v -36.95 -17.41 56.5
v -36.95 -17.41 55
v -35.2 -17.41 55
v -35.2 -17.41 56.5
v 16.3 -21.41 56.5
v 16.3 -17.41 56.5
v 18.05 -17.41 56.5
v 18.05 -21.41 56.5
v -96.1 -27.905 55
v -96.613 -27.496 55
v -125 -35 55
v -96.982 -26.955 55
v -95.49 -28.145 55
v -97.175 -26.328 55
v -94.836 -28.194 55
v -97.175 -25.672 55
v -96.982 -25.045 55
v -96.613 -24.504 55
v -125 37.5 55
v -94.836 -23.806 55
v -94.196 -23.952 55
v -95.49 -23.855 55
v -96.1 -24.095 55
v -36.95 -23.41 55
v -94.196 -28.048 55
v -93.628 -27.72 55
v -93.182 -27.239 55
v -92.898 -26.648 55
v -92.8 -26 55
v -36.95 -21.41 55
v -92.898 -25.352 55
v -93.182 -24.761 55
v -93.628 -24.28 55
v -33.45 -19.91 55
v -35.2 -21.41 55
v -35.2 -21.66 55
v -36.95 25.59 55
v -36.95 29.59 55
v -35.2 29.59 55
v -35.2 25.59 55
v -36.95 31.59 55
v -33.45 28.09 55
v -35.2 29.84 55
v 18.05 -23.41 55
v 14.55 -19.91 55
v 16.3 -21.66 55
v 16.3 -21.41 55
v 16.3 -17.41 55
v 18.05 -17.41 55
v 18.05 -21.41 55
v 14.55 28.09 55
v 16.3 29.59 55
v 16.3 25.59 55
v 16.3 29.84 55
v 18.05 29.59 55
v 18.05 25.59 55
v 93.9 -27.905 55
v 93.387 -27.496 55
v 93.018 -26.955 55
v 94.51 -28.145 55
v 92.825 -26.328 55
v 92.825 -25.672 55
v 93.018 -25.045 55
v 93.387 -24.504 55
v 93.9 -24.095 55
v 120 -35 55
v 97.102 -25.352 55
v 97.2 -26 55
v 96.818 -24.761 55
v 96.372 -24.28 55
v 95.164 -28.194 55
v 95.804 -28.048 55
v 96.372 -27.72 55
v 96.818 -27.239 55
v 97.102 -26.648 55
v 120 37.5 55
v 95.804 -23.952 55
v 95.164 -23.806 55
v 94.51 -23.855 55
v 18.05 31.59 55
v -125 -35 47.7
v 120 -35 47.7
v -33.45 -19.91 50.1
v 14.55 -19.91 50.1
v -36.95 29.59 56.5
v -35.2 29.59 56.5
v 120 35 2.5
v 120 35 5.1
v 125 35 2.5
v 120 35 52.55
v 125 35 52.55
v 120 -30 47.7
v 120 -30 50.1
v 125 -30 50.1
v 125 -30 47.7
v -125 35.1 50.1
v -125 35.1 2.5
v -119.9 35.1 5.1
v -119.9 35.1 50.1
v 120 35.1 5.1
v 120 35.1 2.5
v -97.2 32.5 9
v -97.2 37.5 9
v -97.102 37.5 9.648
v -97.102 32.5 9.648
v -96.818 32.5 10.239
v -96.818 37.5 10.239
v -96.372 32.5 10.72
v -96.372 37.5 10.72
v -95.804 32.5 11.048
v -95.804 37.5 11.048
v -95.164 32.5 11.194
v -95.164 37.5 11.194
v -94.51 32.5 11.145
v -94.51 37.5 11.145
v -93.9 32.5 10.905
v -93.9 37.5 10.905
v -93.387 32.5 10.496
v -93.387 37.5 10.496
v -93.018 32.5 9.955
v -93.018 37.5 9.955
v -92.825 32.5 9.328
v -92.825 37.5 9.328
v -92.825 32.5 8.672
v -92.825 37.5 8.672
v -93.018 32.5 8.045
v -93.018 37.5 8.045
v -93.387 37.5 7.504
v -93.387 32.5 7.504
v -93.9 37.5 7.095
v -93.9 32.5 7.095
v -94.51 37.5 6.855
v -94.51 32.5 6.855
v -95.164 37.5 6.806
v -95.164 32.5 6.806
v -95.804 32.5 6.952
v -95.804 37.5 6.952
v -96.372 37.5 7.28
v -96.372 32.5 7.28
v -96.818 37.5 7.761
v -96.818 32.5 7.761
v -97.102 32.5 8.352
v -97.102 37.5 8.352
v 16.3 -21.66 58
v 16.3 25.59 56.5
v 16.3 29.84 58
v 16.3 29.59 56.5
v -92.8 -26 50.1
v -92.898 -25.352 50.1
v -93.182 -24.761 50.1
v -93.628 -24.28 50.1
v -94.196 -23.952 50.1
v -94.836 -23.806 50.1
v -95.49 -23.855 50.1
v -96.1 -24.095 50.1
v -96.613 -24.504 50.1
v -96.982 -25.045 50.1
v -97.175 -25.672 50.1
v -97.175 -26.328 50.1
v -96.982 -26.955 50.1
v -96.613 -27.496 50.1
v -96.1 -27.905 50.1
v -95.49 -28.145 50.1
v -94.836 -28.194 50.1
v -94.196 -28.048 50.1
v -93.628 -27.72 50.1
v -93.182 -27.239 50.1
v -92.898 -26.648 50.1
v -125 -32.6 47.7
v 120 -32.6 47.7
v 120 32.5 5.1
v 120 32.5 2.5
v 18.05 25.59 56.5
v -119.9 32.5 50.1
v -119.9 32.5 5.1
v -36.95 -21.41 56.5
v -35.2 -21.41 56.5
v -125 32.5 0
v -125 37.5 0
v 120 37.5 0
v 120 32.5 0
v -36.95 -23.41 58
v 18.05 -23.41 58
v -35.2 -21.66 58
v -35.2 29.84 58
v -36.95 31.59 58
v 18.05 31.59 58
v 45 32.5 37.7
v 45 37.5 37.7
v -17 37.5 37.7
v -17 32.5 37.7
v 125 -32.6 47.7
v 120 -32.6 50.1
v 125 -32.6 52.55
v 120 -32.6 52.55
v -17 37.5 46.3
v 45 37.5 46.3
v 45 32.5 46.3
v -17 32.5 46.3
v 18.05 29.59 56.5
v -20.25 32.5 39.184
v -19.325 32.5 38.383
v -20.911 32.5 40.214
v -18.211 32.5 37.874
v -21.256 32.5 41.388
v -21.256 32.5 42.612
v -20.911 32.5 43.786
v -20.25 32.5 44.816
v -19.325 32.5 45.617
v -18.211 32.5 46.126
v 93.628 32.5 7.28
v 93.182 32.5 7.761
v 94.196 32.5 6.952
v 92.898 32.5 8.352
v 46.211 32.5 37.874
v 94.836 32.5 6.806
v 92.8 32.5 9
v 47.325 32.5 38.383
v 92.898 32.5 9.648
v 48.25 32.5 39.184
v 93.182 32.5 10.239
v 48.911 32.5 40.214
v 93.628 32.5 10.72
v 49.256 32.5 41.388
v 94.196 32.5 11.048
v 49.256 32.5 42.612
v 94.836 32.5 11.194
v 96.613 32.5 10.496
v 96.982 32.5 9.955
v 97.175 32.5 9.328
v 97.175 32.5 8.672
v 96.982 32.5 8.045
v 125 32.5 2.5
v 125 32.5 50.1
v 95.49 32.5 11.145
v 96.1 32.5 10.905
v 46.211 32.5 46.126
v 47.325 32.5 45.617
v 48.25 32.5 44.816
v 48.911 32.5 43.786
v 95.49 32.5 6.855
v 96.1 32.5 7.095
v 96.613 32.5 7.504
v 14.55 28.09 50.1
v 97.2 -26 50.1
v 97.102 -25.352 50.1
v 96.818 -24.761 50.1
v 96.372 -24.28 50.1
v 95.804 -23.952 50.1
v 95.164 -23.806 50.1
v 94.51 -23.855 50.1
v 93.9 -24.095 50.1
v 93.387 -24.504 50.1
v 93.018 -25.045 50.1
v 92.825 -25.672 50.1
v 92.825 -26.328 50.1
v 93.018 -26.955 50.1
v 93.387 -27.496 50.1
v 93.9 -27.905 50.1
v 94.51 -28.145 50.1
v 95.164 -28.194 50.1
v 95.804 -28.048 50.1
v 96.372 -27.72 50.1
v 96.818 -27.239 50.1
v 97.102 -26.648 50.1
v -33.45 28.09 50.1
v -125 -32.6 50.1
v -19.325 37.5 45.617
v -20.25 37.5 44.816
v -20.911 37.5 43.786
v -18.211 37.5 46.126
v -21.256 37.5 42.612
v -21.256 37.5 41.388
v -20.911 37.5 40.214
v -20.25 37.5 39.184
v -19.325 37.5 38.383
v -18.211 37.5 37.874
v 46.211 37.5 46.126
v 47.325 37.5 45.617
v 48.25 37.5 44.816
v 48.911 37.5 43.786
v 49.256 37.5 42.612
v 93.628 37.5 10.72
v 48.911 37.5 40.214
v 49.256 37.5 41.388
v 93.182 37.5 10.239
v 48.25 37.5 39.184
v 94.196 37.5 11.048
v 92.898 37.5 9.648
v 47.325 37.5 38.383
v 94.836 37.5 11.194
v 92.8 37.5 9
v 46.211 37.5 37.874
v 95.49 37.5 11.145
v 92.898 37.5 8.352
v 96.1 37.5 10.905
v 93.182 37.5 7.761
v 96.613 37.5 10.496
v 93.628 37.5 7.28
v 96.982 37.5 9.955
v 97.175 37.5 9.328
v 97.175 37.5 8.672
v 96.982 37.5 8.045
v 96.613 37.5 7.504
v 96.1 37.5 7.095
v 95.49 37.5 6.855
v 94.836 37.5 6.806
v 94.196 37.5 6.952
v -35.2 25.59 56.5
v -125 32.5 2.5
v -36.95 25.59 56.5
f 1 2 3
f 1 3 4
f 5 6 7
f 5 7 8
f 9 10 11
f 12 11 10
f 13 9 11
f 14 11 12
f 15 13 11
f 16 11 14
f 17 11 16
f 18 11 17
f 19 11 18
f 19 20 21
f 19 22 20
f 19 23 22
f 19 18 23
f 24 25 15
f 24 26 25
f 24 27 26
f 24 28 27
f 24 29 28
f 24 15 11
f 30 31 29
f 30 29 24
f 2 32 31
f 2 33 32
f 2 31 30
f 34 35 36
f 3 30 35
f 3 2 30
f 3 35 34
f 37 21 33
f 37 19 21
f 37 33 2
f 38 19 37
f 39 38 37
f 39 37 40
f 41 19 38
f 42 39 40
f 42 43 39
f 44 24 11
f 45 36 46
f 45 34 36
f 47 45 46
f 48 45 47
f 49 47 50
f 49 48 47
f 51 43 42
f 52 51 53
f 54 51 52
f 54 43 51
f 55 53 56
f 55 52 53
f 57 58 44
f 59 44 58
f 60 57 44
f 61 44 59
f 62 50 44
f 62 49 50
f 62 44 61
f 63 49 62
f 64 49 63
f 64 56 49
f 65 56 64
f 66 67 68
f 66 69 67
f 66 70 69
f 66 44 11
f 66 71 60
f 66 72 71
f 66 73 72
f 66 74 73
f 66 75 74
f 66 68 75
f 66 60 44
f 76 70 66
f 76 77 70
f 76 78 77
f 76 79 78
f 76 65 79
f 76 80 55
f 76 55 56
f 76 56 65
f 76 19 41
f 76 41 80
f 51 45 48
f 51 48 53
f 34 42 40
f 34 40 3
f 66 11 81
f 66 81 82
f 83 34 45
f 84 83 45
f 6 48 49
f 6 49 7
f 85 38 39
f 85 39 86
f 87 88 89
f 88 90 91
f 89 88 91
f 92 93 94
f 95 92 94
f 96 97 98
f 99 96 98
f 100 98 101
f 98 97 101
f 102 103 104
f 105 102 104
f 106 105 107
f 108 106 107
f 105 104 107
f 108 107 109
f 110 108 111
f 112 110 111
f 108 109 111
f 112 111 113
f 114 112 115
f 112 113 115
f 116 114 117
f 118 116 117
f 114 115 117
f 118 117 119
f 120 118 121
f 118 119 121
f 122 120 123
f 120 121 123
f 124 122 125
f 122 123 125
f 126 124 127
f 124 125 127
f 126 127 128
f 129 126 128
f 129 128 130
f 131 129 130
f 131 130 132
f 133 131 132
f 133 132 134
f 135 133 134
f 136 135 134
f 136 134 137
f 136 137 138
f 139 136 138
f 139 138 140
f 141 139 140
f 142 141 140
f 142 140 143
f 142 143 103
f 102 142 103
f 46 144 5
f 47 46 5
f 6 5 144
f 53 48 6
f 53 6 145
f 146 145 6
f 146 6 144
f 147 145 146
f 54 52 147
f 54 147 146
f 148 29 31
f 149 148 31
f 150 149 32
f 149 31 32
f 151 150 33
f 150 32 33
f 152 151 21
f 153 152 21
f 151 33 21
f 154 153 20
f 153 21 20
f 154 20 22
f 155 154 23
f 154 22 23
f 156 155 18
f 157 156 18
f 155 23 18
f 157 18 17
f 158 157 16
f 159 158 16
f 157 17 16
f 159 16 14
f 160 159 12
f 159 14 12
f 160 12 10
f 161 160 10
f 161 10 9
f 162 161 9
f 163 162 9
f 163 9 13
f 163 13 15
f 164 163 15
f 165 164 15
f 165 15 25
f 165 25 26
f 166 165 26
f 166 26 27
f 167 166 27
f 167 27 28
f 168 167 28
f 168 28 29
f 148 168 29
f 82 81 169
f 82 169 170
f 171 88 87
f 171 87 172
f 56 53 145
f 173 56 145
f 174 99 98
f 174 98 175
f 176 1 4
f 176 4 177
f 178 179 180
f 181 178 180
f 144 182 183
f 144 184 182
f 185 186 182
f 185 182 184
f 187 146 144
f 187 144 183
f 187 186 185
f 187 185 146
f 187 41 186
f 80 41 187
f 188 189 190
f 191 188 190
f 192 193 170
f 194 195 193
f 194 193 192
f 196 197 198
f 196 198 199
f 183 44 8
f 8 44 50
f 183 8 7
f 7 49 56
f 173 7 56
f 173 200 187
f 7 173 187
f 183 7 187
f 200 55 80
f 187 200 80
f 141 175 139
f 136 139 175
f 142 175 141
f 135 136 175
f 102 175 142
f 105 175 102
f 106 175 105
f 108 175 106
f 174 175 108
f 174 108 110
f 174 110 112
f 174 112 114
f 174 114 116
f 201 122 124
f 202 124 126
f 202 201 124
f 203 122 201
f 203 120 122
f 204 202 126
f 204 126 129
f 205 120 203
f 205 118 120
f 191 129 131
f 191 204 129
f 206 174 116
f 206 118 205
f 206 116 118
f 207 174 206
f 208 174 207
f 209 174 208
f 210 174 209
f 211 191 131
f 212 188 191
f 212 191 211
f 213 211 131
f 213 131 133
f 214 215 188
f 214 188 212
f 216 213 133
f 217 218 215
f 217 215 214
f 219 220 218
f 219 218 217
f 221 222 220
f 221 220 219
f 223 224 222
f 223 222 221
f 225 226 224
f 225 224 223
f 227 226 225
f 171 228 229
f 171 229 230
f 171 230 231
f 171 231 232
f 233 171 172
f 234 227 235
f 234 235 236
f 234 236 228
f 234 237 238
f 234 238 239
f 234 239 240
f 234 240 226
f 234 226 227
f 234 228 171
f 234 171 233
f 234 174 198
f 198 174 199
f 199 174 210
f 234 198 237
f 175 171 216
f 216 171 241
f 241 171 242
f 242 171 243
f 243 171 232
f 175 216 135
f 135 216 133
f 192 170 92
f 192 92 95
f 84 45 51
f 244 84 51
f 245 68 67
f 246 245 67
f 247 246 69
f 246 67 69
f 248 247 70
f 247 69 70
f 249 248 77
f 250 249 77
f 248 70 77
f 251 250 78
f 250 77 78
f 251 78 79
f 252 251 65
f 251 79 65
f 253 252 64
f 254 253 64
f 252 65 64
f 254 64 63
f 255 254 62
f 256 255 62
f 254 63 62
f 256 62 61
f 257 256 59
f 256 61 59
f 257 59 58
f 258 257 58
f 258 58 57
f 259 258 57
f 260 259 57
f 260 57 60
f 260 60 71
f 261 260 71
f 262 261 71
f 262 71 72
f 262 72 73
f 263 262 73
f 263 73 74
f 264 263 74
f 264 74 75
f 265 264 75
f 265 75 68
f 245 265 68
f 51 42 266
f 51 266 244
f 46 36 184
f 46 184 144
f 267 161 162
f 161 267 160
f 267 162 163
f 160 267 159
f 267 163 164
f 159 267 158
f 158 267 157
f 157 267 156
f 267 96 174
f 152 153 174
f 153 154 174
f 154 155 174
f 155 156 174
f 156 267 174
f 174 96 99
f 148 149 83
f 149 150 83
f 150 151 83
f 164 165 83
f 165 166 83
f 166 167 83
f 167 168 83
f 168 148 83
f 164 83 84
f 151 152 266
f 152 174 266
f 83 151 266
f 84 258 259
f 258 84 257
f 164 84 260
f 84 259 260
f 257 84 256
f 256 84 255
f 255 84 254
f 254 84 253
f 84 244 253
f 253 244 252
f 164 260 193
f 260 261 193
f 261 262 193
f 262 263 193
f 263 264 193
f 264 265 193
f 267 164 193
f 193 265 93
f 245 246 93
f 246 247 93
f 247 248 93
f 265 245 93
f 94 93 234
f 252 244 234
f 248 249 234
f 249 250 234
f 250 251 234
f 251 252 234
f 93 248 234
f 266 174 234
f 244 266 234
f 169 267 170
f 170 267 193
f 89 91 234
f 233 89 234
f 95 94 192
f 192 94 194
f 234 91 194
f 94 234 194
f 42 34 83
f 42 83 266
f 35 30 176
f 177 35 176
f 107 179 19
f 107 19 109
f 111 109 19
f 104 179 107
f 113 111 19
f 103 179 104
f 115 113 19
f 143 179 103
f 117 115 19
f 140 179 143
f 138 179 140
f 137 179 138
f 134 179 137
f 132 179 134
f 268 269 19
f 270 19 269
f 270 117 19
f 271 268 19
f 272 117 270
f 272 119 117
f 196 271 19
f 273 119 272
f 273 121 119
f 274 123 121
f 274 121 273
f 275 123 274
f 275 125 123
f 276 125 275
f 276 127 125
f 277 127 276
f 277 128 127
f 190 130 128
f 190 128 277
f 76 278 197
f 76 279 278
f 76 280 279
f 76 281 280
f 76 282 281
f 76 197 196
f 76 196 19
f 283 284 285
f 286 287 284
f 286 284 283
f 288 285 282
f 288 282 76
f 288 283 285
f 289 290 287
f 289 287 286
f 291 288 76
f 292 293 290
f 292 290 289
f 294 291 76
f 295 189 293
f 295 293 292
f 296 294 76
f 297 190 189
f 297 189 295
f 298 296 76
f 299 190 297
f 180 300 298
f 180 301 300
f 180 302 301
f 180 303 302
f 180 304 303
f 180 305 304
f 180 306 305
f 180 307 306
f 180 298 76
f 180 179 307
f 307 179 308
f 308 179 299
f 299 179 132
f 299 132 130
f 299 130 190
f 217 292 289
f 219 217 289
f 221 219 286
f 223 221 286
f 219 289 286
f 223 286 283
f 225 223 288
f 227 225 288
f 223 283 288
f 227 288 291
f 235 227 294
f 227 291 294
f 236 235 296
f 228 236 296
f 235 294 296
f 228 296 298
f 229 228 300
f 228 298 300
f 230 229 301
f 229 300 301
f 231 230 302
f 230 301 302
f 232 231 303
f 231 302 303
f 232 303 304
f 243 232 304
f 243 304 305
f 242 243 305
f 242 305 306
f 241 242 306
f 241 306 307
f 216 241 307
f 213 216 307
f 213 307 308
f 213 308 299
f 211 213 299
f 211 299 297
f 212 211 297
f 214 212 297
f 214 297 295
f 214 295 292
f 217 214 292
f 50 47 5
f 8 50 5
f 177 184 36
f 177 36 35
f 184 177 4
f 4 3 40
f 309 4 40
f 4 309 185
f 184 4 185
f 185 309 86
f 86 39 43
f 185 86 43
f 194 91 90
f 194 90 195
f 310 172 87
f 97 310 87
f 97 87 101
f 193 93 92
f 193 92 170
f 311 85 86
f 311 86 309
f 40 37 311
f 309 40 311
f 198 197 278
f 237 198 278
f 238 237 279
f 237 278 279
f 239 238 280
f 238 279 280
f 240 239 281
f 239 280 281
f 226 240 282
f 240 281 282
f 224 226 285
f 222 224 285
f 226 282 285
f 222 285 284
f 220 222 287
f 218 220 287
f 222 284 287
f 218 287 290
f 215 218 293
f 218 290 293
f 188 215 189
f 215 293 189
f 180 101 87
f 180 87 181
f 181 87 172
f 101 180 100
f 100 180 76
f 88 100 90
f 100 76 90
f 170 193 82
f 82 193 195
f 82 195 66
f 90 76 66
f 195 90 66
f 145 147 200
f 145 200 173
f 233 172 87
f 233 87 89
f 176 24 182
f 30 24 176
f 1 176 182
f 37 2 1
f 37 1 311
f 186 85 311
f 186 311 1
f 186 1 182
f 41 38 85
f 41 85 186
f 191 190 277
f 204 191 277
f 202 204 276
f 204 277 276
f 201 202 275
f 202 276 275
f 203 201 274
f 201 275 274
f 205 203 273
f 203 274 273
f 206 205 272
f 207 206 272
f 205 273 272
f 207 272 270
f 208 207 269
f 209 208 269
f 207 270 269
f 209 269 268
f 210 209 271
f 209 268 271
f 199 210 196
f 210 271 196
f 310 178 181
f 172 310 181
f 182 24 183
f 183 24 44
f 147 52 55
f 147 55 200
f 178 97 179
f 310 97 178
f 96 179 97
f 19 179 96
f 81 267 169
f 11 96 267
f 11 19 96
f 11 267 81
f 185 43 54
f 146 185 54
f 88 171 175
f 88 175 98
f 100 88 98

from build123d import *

# Parameters (mm, degrees)
SKETCH_W        = 250
SKETCH_H        = 5
PAD012_DEPTH    = 55
SKETCH023_W     = 2.6
SKETCH023_H     = 2.6
POCKET007_DEPTH = 250.001
SKETCH024_W     = 5.1
SKETCH024_H     = 2.6
POCKET008_DEPTH = 45
SKETCH025_W     = 250
SKETCH025_H     = 4.9
PAD013_DEPTH    = 67.5
SKETCH026_W     = 250
SKETCH026_H     = 2.4
PAD014_DEPTH    = 2.4
SKETCH027_R     = 2.2
HOLE004_DEPTH   = 23.678107
HOLE004_TIPS_R  = 2.2
SKETCH028_R     = 2.2
HOLE005_DEPTH   = 23.678107
HOLE005_TIPS_R  = 2.2
POCKET009_DEPTH = 5
SKETCH030_W     = 48
SKETCH030_H     = 48
POCKET010_DEPTH = 4.9
SKETCH031_W     = 55
SKETCH031_H     = 55
SKETCH031_W_2   = 51.5
SKETCH031_H_2   = 51.5
PAD015_DEPTH    = 3
SKETCH032_W     = 4
SKETCH032_H     = 1.5
POCKET011_DEPTH = 161.951
POCKET012_DEPTH = 5
SKETCH035_W     = 5
SKETCH035_H     = 2.5
PAD016_DEPTH    = 2.6
SKETCH036_W     = 5
SKETCH036_H     = 2.6
PAD017_DEPTH    = 2.4


with BuildPart() as part:
    # Sketch → Pad012 (new body)
    with BuildSketch(Plane.XY):
        with Locations((0, 35)):
            Rectangle(SKETCH_W, SKETCH_H)
    extrude(amount=PAD012_DEPTH)

    # Sketch023 (on Face2 of Pad012) → Pocket007 (cut, through all)
    with BuildSketch(Plane.YZ.offset(125)):
        with Locations((33.8, 3.8)):
            Rectangle(SKETCH023_W, SKETCH023_H)
    extrude(amount=-POCKET007_DEPTH, mode=Mode.SUBTRACT)

    # Sketch024 (on Face7 of Pocket007) → Pocket008 (cut)
    with BuildSketch(Plane(origin=(0, 0, 5.1), x_dir=(1, 0, 0), z_dir=(0, 0, -1))):
        with Locations((-122.45, -33.8)):
            Rectangle(SKETCH024_W, SKETCH024_H)
    extrude(amount=-POCKET008_DEPTH, mode=Mode.SUBTRACT)

    # Sketch025 (on Face6 of Pocket008) → Pad013 (join)
    with BuildSketch(Plane.XZ.offset(-32.5)):
        with Locations((0, 52.55)):
            Rectangle(SKETCH025_W, SKETCH025_H)
    extrude(amount=PAD013_DEPTH)

    # Sketch026 (on Face16 of Pad013) → Pad014 (join)
    with BuildSketch(Plane(origin=(0, 0, 50.1), x_dir=(1, 0, 0), z_dir=(0, 0, -1))):
        with Locations((0, 33.8)):
            Rectangle(SKETCH026_W, SKETCH026_H)
    extrude(amount=PAD014_DEPTH)

    # Sketch027 (on Face1 of Pad014) → Hole004 (cut)
    with BuildSketch(Plane(origin=(0, 37.5, 0), x_dir=(-1, 0, 0), z_dir=(0, 1, 0))):
        with Locations((-95, 9)):
            Circle(SKETCH027_R)
        with Locations((95, 9)):
            Circle(SKETCH027_R)
    extrude(amount=-HOLE004_DEPTH, mode=Mode.SUBTRACT)

    # Hole004 tips → Hole004 tip 1 section 0
    with BuildSketch(Plane(origin=(0, 13.821893, 0), x_dir=(-1, 0, 0), z_dir=(0, 1, 0)), mode=Mode.PRIVATE) as hole004_tip_1_s0:
        with Locations((-95, 9)):
            Circle(HOLE004_TIPS_R)
    loft([hole004_tip_1_s0.sketch, Vertex(95, 12.5, 9)], mode=Mode.SUBTRACT)

    # Hole004 tips → Hole004 tip 2 section 0
    with BuildSketch(Plane(origin=(0, 13.821893, 0), x_dir=(-1, 0, 0), z_dir=(0, 1, 0)), mode=Mode.PRIVATE) as hole004_tip_2_s0:
        with Locations((95, 9)):
            Circle(HOLE004_TIPS_R)
    loft([hole004_tip_2_s0.sketch, Vertex(-95, 12.5, 9)], mode=Mode.SUBTRACT)

    # Sketch028 (on Face14 of Hole004) → Hole005 (cut)
    with BuildSketch(Plane.XY.offset(55)):
        with Locations((-95, -26)):
            Circle(SKETCH028_R)
        with Locations((95, -26)):
            Circle(SKETCH028_R)
    extrude(amount=-HOLE005_DEPTH, mode=Mode.SUBTRACT)

    # Hole005 tips → Hole005 tip 1 section 0
    with BuildSketch(Plane.XY.offset(31.321893), mode=Mode.PRIVATE) as hole005_tip_1_s0:
        with Locations((-95, -26)):
            Circle(HOLE005_TIPS_R)
    loft([hole005_tip_1_s0.sketch, Vertex(-95, -26, 30)], mode=Mode.SUBTRACT)

    # Hole005 tips → Hole005 tip 2 section 0
    with BuildSketch(Plane.XY.offset(31.321893), mode=Mode.PRIVATE) as hole005_tip_2_s0:
        with Locations((95, -26)):
            Circle(HOLE005_TIPS_R)
    loft([hole005_tip_2_s0.sketch, Vertex(95, -26, 30)], mode=Mode.SUBTRACT)

    # Sketch029 (on Face1 of Hole005) → Pocket009 (cut)
    with BuildSketch(Plane(origin=(0, 37.5, 0), x_dir=(-1, 0, 0), z_dir=(0, 1, 0))):
        with BuildLine():
            ThreePointArc((-45, 46.3), (-49.3, 42), (-45, 37.7))
            Line((-45, 37.7), (17, 37.7))
            ThreePointArc((17, 37.7), (21.3, 42), (17, 46.3))
            Line((-45, 46.3), (17, 46.3))
        make_face()
    extrude(amount=-POCKET009_DEPTH, mode=Mode.SUBTRACT)

    # Sketch030 (on Face18 of Pocket009) → Pocket010 (cut)
    with BuildSketch(Plane.XY.offset(55)):
        with Locations((-9.45, 4.09)):
            Rectangle(SKETCH030_W, SKETCH030_H)
    extrude(amount=-POCKET010_DEPTH, mode=Mode.SUBTRACT)

    # Sketch031 (on Face18 of Pocket010) → Pad015 (join)
    with BuildSketch(Plane.XY.offset(55)):
        with Locations((-9.45, 4.09)):
            Rectangle(SKETCH031_W, SKETCH031_H)
        with Locations((-9.45, 4.09)):
            Rectangle(SKETCH031_W_2, SKETCH031_H_2, mode=Mode.SUBTRACT)
    extrude(amount=PAD015_DEPTH)

    # Sketch032 (on Face30 of Pad015) → Pocket011 (cut, through all)
    with BuildSketch(Plane(origin=(-36.95, 0, 0), x_dir=(0, -1, 0), z_dir=(-1, 0, 0))):
        with Locations((-27.59, 55.75)):
            Rectangle(SKETCH032_W, SKETCH032_H)
        with Locations((19.41, 55.75)):
            Rectangle(SKETCH032_W, SKETCH032_H)
    extrude(amount=-POCKET011_DEPTH, mode=Mode.SUBTRACT)

    # Sketch033 (on Face21 of Pocket011) → Pocket012 (cut)
    with BuildSketch(Plane.YZ.offset(125)):
        Polygon((-32.6, 47.7), (-35, 47.7), (-35, 55), (37.5, 55), (37.5, 0), (32.5, 0), (32.5, 2.5), (35, 2.5), (35, 52.55), (-32.6, 52.55), align=None)
    extrude(amount=-POCKET012_DEPTH, mode=Mode.SUBTRACT)

    # Sketch035 (on Face17 of Pocket012) → Pad016 (join)
    with BuildSketch(Plane(origin=(0, 0, 5.1), x_dir=(1, 0, 0), z_dir=(0, 0, -1))):
        with Locations((122.5, -33.75)):
            Rectangle(SKETCH035_W, SKETCH035_H)
    extrude(amount=PAD016_DEPTH)

    # Sketch036 (on Face31 of Pad016) → Pad017 (join)
    with BuildSketch(Plane(origin=(0, 0, 50.1), x_dir=(1, 0, 0), z_dir=(0, 0, -1))):
        with Locations((122.5, 31.3)):
            Rectangle(SKETCH036_W, SKETCH036_H)
    extrude(amount=PAD017_DEPTH)


solid = part.part
